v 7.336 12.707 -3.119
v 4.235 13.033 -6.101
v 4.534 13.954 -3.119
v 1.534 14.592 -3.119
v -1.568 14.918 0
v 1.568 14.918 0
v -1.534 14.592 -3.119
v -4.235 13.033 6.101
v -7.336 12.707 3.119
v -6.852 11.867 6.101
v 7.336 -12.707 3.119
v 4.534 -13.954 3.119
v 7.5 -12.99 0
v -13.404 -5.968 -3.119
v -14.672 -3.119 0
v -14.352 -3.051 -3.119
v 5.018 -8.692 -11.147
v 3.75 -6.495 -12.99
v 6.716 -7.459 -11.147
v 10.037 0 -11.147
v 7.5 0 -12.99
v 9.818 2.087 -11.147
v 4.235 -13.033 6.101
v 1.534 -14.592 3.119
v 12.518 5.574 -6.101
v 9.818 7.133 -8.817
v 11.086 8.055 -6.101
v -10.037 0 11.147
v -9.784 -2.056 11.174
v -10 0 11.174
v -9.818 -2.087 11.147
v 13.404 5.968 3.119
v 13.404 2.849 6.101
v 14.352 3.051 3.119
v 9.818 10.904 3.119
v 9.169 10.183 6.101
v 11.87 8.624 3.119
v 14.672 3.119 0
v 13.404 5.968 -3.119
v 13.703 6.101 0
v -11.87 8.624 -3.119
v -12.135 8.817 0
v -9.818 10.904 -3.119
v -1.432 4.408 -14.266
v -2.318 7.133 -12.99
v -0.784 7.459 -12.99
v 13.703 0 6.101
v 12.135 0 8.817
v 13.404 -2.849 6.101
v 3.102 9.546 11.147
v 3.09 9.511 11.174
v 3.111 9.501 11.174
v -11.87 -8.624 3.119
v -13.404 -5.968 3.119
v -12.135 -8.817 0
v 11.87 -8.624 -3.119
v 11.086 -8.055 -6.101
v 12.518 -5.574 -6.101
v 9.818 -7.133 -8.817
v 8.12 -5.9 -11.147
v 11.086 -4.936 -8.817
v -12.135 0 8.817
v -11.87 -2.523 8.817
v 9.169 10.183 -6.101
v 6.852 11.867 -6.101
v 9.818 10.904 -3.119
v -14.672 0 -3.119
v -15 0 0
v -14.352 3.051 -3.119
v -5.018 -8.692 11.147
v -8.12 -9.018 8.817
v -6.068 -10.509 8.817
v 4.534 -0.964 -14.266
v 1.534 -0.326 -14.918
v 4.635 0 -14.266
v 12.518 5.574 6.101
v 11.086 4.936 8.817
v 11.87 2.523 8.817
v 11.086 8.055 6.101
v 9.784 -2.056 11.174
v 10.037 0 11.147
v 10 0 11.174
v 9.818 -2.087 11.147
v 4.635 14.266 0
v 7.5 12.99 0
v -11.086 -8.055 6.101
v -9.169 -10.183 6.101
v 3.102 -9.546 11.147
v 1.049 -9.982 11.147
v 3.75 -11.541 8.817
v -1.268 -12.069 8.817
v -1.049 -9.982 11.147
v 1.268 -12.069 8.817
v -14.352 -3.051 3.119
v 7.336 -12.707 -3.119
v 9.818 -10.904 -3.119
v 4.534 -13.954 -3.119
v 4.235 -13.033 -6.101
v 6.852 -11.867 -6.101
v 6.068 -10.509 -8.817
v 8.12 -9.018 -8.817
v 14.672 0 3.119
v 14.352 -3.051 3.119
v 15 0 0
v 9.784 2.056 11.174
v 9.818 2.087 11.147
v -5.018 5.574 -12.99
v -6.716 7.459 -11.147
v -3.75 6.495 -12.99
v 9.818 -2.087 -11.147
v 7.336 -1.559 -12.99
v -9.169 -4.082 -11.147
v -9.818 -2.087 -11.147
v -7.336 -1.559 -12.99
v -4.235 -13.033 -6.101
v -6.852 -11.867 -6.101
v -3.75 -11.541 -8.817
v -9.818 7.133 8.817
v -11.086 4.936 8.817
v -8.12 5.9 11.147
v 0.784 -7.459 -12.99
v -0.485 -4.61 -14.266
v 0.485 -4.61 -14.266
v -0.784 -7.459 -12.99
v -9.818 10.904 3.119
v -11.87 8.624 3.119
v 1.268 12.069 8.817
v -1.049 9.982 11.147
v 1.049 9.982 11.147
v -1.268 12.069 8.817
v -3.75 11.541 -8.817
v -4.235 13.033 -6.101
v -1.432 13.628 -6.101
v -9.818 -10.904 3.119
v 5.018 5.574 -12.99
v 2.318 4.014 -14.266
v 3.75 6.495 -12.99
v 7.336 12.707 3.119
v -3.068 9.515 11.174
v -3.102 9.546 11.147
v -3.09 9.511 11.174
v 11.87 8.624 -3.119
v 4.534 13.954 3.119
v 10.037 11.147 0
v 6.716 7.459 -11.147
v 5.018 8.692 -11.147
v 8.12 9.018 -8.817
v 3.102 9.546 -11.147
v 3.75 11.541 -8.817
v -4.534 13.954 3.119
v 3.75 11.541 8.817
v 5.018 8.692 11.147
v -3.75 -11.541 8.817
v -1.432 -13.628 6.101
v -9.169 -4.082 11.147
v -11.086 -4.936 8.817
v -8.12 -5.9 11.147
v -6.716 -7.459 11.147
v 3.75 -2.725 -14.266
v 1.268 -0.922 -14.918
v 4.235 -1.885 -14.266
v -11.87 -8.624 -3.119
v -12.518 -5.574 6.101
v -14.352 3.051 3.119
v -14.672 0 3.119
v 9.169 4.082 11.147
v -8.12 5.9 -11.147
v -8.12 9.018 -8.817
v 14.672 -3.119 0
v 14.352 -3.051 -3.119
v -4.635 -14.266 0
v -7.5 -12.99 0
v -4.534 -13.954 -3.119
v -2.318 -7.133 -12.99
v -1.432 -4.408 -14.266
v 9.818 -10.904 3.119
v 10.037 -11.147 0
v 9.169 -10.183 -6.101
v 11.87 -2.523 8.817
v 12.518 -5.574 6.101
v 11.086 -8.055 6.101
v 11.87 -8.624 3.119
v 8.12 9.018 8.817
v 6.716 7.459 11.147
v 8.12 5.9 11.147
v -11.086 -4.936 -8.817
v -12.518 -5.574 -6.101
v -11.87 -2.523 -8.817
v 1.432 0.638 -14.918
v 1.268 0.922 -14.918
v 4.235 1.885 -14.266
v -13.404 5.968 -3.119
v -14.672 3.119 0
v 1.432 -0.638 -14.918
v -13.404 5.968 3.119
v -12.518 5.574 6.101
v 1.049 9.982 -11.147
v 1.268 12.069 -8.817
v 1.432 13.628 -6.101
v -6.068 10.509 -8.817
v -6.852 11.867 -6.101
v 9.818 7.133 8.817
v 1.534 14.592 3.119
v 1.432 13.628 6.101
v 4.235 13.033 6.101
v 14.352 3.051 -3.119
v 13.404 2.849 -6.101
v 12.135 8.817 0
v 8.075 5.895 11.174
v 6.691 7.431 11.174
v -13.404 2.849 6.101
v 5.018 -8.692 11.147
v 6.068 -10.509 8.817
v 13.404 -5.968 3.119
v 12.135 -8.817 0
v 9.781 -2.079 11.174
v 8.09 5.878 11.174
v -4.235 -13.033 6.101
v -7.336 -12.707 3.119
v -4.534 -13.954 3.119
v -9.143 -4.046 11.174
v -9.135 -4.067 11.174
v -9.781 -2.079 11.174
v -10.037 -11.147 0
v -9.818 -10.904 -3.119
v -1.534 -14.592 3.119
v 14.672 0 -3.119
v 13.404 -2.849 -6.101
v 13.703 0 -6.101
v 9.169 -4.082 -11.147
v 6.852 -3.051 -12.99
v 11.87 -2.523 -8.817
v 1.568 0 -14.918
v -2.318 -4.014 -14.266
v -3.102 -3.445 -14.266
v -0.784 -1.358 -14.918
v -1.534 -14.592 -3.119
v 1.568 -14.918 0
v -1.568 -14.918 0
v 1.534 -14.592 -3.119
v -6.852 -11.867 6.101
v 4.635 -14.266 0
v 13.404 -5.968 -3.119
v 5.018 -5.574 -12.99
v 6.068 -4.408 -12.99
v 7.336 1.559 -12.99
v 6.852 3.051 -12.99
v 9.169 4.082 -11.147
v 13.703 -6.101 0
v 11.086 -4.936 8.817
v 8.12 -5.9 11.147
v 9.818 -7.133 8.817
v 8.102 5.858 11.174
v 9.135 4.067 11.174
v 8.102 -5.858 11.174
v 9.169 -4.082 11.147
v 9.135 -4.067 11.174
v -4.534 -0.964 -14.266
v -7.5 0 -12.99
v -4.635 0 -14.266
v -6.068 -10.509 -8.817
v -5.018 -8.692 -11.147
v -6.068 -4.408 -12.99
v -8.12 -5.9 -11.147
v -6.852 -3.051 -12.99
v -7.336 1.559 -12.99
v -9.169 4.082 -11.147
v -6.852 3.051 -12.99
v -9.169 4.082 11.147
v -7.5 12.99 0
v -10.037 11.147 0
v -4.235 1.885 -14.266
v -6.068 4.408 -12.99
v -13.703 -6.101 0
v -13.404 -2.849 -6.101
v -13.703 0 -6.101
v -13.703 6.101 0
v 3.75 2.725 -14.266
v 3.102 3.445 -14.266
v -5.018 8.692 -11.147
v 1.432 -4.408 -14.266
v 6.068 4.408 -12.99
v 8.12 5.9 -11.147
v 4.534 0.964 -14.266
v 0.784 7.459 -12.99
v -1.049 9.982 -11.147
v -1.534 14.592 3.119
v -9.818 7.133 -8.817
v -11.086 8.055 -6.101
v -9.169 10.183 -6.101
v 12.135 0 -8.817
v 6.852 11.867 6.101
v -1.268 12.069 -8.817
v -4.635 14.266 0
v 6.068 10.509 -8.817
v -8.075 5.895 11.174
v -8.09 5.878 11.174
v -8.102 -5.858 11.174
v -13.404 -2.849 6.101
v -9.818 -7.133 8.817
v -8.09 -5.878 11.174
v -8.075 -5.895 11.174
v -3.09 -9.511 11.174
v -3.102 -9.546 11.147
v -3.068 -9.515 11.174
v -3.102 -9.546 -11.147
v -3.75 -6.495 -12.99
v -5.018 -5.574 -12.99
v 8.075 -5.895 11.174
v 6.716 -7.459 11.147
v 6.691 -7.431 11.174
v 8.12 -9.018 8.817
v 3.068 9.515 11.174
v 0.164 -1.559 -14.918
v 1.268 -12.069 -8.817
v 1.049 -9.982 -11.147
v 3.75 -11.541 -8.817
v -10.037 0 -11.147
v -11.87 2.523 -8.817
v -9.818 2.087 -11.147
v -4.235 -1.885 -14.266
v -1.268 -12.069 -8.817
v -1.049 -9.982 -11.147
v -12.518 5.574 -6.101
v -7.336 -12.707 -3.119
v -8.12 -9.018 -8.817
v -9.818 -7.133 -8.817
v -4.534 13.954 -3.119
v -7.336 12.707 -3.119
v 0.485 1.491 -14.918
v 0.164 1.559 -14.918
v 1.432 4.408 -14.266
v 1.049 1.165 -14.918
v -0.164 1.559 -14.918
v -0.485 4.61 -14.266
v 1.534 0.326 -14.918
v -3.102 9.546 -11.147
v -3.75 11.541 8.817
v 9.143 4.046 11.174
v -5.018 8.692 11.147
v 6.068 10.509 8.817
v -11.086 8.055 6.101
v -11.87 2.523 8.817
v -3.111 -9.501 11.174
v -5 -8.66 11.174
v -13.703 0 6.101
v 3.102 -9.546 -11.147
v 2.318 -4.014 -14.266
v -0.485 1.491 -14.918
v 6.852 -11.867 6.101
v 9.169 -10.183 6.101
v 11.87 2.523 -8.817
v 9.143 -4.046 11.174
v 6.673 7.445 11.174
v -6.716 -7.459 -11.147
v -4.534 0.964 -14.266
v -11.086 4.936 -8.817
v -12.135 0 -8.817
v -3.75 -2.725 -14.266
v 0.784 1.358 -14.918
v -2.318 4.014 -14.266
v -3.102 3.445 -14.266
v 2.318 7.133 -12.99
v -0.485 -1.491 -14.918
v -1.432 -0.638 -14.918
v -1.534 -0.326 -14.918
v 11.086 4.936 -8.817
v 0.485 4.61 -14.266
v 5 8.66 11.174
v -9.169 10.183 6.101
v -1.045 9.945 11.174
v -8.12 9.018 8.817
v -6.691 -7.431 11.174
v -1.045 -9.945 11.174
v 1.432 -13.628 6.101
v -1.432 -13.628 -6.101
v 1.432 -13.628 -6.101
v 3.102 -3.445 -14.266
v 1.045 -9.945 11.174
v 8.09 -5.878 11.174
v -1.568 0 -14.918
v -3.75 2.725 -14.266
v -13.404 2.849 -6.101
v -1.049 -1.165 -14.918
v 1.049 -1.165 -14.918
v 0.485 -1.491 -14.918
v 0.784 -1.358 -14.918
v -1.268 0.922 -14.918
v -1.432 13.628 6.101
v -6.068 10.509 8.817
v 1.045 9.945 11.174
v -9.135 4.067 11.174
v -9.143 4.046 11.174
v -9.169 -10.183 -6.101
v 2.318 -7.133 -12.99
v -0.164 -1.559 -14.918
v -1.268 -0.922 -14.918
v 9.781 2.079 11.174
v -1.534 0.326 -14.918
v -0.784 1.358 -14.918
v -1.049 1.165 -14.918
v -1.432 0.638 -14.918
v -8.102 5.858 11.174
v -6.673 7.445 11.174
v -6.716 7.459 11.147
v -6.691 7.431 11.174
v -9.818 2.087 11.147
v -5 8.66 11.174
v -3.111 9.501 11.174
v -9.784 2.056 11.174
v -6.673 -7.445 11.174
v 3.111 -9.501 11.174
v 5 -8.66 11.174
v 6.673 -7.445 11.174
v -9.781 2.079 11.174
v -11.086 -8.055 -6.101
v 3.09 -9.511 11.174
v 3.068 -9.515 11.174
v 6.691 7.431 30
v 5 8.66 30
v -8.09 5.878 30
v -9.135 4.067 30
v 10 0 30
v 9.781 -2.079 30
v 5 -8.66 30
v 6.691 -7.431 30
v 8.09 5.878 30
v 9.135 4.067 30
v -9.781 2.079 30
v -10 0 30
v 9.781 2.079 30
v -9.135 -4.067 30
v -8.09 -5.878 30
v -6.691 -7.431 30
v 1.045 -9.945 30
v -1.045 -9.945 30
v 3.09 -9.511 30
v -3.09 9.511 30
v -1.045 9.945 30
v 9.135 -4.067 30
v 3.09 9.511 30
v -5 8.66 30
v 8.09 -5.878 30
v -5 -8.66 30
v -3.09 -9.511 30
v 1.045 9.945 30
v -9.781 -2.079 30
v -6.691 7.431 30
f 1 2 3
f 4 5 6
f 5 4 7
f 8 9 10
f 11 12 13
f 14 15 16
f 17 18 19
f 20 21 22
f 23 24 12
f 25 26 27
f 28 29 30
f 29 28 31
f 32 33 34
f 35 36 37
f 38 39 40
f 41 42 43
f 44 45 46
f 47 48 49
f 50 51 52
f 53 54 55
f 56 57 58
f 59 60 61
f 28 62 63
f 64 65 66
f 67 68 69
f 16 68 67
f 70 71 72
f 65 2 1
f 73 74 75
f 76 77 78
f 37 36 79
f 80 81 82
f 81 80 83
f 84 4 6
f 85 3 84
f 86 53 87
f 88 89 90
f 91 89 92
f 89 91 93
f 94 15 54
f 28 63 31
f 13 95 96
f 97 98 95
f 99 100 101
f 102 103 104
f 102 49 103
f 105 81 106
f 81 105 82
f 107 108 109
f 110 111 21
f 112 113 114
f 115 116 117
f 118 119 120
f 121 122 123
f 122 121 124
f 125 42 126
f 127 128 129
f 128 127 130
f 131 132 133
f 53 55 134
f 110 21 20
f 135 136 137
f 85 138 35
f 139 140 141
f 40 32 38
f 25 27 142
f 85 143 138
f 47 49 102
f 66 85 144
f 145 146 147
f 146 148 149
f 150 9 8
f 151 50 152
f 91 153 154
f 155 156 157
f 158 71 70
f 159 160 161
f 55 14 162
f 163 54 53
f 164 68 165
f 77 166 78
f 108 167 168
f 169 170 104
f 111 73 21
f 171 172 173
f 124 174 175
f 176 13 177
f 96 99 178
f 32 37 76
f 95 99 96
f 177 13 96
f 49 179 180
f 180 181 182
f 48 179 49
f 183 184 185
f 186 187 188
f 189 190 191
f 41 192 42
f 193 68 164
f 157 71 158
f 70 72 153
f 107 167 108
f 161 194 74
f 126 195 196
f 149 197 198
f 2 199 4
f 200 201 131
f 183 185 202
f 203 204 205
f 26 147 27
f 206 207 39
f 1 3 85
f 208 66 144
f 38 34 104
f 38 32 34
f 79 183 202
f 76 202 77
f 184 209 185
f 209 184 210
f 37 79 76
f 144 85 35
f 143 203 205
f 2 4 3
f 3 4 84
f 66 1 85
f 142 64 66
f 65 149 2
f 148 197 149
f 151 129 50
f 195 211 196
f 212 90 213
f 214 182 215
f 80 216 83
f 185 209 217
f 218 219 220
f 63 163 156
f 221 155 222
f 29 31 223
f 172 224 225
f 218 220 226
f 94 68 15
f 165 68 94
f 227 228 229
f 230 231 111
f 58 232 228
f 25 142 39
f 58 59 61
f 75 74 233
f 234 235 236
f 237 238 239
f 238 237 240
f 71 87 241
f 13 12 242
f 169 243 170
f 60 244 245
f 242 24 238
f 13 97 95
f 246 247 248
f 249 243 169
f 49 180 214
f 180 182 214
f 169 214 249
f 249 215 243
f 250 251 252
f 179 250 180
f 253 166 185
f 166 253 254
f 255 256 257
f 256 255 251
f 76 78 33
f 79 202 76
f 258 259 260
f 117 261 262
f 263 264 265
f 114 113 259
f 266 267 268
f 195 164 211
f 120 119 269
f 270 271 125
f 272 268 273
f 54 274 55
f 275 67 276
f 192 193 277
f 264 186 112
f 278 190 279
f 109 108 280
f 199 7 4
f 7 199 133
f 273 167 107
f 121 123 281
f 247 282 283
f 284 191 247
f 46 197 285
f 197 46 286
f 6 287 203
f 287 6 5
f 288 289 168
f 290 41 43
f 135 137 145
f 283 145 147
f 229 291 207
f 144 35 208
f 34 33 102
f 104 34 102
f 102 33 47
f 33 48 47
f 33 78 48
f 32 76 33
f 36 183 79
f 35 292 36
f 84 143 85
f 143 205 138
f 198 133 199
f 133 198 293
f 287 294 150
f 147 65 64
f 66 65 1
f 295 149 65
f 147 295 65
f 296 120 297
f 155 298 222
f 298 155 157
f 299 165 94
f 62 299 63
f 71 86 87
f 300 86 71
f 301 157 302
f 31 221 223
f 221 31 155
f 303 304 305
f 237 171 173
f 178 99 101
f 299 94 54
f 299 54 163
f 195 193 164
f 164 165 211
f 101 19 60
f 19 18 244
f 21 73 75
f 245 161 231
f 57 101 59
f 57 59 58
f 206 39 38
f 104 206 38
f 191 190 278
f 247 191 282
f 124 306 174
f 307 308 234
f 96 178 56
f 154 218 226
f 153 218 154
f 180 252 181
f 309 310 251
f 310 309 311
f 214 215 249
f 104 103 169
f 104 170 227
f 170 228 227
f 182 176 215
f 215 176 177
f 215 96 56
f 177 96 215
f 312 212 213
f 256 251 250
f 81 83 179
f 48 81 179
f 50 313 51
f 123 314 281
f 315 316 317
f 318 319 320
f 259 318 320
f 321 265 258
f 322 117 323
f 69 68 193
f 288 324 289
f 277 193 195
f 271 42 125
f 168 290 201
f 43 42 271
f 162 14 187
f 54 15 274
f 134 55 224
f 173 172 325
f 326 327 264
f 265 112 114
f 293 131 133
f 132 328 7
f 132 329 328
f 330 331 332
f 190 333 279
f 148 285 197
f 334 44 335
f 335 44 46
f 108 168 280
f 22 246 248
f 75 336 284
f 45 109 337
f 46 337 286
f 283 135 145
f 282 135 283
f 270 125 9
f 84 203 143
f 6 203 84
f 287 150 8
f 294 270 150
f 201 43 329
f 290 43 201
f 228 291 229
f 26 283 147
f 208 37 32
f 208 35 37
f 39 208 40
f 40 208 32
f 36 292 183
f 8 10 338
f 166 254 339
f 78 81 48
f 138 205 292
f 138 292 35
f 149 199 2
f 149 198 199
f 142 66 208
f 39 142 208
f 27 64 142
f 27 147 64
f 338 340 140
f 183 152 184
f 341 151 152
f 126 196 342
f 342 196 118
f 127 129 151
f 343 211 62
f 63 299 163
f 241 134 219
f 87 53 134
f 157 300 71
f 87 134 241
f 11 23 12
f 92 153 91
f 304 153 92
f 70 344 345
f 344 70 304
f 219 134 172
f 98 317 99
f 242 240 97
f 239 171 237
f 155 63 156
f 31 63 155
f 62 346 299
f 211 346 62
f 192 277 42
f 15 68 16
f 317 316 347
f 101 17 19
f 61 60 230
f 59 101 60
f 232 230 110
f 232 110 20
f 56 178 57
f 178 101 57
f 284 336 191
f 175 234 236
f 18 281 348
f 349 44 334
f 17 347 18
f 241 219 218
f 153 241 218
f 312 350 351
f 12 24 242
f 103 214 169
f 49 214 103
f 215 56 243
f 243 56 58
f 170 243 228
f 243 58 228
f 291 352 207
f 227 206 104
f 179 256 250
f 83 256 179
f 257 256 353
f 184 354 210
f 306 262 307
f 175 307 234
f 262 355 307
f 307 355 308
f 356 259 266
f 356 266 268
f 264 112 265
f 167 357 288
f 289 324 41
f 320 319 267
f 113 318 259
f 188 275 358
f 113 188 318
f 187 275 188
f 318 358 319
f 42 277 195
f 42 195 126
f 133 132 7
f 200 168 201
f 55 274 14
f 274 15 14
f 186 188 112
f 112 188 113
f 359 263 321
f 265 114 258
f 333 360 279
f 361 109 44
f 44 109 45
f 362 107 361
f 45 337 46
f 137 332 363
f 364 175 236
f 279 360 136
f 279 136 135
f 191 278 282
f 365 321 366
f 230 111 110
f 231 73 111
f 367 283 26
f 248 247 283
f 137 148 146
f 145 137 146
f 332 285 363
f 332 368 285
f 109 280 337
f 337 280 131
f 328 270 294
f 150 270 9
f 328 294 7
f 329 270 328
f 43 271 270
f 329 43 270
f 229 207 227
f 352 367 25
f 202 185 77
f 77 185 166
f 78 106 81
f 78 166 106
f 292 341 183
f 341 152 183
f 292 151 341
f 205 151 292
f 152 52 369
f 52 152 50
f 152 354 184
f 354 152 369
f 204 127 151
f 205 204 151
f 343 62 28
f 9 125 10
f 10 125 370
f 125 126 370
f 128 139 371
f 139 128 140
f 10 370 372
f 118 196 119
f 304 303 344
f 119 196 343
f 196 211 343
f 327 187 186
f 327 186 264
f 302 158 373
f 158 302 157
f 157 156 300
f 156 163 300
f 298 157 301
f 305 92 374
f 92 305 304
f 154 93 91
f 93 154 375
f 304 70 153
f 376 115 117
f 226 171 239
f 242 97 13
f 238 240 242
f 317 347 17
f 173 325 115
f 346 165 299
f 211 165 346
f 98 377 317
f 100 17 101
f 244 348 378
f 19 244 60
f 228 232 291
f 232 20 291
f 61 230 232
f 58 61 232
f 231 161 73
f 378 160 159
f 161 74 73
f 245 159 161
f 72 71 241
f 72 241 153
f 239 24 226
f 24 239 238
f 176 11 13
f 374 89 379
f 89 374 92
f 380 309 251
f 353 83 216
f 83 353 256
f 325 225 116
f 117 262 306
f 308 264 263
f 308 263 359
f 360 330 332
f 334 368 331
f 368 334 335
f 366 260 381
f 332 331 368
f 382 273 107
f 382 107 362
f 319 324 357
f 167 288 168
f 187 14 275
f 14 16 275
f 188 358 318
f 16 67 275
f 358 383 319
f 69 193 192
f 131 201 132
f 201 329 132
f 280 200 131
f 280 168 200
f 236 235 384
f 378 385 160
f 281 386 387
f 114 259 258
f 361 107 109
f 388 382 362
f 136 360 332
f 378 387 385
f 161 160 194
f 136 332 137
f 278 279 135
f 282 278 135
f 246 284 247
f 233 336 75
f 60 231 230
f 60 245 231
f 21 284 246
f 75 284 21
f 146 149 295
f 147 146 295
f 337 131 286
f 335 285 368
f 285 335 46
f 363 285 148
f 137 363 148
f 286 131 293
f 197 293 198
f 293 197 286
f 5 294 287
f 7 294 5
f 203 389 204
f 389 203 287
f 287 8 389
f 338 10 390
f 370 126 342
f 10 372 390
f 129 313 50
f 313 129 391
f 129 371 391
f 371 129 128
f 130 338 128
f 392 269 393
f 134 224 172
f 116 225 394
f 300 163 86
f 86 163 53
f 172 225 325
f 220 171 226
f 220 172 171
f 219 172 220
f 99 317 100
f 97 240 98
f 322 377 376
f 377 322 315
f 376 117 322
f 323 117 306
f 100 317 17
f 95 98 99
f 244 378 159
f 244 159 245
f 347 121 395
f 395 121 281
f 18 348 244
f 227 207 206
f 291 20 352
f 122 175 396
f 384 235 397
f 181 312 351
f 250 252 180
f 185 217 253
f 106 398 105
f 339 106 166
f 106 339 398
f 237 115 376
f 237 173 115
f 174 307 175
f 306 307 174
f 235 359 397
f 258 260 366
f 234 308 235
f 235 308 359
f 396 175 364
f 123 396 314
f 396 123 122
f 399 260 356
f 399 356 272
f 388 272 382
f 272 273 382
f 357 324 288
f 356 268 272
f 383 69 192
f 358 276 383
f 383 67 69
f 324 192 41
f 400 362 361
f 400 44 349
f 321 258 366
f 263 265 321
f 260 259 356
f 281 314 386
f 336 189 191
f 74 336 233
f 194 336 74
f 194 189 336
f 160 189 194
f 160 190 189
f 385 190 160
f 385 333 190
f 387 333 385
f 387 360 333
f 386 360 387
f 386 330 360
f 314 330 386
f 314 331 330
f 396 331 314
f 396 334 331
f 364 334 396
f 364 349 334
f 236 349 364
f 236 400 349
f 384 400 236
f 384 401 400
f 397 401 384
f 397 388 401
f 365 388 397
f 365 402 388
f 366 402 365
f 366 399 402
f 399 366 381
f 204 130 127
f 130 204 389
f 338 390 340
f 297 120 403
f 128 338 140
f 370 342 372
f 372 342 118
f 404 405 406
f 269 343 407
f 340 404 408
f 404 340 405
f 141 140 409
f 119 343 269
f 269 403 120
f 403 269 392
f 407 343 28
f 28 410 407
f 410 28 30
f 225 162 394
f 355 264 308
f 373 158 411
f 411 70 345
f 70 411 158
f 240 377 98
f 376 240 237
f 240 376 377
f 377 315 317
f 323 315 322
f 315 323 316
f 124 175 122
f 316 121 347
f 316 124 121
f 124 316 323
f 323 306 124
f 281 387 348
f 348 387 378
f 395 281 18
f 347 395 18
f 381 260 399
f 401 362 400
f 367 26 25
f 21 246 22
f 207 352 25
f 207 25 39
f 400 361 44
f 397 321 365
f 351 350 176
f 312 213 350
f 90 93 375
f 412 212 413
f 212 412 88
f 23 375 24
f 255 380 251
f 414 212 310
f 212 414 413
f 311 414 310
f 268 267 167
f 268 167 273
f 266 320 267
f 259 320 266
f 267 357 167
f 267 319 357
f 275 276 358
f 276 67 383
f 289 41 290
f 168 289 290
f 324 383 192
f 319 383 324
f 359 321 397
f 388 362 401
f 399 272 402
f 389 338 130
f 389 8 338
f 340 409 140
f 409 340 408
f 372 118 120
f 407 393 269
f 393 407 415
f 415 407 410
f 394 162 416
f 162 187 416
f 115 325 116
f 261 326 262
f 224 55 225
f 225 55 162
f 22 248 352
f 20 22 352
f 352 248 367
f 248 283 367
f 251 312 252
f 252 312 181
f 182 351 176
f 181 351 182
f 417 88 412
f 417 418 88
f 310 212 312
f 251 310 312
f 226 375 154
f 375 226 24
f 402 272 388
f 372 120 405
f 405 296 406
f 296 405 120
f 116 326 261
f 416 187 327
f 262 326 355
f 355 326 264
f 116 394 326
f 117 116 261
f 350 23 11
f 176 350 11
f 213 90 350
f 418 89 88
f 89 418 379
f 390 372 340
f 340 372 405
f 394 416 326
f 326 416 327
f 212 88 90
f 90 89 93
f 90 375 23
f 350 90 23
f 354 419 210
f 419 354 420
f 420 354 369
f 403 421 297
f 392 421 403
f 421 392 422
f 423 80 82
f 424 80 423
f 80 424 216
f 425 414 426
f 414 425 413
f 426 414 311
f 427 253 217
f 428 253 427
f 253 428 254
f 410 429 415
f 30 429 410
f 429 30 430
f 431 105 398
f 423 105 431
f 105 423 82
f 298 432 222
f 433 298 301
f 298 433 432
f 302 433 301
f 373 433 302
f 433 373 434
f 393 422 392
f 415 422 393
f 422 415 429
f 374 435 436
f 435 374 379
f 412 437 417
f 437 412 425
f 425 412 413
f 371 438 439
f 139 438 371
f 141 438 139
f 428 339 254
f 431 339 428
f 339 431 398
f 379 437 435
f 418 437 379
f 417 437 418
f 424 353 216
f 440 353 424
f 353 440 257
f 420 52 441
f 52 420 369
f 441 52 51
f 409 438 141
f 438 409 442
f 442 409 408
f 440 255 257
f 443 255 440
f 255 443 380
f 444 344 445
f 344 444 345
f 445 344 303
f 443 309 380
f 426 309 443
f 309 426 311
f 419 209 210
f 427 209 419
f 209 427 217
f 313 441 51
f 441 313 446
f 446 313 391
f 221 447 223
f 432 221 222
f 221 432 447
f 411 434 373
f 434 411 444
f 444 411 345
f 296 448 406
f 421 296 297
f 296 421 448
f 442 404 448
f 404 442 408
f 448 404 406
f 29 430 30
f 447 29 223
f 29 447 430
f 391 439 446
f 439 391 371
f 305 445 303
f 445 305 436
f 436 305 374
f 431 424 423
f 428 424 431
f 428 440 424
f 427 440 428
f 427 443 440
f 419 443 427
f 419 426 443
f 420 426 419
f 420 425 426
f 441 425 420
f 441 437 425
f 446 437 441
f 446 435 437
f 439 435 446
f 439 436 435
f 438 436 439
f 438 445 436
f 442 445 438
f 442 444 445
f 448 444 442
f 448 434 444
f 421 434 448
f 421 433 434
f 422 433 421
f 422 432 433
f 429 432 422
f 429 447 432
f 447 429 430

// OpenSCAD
sphere(15); // Esfera de radio 15 mm
cylinder(h=30, r=10); // Cilindro de altura 30 mm y radio 10 mm
